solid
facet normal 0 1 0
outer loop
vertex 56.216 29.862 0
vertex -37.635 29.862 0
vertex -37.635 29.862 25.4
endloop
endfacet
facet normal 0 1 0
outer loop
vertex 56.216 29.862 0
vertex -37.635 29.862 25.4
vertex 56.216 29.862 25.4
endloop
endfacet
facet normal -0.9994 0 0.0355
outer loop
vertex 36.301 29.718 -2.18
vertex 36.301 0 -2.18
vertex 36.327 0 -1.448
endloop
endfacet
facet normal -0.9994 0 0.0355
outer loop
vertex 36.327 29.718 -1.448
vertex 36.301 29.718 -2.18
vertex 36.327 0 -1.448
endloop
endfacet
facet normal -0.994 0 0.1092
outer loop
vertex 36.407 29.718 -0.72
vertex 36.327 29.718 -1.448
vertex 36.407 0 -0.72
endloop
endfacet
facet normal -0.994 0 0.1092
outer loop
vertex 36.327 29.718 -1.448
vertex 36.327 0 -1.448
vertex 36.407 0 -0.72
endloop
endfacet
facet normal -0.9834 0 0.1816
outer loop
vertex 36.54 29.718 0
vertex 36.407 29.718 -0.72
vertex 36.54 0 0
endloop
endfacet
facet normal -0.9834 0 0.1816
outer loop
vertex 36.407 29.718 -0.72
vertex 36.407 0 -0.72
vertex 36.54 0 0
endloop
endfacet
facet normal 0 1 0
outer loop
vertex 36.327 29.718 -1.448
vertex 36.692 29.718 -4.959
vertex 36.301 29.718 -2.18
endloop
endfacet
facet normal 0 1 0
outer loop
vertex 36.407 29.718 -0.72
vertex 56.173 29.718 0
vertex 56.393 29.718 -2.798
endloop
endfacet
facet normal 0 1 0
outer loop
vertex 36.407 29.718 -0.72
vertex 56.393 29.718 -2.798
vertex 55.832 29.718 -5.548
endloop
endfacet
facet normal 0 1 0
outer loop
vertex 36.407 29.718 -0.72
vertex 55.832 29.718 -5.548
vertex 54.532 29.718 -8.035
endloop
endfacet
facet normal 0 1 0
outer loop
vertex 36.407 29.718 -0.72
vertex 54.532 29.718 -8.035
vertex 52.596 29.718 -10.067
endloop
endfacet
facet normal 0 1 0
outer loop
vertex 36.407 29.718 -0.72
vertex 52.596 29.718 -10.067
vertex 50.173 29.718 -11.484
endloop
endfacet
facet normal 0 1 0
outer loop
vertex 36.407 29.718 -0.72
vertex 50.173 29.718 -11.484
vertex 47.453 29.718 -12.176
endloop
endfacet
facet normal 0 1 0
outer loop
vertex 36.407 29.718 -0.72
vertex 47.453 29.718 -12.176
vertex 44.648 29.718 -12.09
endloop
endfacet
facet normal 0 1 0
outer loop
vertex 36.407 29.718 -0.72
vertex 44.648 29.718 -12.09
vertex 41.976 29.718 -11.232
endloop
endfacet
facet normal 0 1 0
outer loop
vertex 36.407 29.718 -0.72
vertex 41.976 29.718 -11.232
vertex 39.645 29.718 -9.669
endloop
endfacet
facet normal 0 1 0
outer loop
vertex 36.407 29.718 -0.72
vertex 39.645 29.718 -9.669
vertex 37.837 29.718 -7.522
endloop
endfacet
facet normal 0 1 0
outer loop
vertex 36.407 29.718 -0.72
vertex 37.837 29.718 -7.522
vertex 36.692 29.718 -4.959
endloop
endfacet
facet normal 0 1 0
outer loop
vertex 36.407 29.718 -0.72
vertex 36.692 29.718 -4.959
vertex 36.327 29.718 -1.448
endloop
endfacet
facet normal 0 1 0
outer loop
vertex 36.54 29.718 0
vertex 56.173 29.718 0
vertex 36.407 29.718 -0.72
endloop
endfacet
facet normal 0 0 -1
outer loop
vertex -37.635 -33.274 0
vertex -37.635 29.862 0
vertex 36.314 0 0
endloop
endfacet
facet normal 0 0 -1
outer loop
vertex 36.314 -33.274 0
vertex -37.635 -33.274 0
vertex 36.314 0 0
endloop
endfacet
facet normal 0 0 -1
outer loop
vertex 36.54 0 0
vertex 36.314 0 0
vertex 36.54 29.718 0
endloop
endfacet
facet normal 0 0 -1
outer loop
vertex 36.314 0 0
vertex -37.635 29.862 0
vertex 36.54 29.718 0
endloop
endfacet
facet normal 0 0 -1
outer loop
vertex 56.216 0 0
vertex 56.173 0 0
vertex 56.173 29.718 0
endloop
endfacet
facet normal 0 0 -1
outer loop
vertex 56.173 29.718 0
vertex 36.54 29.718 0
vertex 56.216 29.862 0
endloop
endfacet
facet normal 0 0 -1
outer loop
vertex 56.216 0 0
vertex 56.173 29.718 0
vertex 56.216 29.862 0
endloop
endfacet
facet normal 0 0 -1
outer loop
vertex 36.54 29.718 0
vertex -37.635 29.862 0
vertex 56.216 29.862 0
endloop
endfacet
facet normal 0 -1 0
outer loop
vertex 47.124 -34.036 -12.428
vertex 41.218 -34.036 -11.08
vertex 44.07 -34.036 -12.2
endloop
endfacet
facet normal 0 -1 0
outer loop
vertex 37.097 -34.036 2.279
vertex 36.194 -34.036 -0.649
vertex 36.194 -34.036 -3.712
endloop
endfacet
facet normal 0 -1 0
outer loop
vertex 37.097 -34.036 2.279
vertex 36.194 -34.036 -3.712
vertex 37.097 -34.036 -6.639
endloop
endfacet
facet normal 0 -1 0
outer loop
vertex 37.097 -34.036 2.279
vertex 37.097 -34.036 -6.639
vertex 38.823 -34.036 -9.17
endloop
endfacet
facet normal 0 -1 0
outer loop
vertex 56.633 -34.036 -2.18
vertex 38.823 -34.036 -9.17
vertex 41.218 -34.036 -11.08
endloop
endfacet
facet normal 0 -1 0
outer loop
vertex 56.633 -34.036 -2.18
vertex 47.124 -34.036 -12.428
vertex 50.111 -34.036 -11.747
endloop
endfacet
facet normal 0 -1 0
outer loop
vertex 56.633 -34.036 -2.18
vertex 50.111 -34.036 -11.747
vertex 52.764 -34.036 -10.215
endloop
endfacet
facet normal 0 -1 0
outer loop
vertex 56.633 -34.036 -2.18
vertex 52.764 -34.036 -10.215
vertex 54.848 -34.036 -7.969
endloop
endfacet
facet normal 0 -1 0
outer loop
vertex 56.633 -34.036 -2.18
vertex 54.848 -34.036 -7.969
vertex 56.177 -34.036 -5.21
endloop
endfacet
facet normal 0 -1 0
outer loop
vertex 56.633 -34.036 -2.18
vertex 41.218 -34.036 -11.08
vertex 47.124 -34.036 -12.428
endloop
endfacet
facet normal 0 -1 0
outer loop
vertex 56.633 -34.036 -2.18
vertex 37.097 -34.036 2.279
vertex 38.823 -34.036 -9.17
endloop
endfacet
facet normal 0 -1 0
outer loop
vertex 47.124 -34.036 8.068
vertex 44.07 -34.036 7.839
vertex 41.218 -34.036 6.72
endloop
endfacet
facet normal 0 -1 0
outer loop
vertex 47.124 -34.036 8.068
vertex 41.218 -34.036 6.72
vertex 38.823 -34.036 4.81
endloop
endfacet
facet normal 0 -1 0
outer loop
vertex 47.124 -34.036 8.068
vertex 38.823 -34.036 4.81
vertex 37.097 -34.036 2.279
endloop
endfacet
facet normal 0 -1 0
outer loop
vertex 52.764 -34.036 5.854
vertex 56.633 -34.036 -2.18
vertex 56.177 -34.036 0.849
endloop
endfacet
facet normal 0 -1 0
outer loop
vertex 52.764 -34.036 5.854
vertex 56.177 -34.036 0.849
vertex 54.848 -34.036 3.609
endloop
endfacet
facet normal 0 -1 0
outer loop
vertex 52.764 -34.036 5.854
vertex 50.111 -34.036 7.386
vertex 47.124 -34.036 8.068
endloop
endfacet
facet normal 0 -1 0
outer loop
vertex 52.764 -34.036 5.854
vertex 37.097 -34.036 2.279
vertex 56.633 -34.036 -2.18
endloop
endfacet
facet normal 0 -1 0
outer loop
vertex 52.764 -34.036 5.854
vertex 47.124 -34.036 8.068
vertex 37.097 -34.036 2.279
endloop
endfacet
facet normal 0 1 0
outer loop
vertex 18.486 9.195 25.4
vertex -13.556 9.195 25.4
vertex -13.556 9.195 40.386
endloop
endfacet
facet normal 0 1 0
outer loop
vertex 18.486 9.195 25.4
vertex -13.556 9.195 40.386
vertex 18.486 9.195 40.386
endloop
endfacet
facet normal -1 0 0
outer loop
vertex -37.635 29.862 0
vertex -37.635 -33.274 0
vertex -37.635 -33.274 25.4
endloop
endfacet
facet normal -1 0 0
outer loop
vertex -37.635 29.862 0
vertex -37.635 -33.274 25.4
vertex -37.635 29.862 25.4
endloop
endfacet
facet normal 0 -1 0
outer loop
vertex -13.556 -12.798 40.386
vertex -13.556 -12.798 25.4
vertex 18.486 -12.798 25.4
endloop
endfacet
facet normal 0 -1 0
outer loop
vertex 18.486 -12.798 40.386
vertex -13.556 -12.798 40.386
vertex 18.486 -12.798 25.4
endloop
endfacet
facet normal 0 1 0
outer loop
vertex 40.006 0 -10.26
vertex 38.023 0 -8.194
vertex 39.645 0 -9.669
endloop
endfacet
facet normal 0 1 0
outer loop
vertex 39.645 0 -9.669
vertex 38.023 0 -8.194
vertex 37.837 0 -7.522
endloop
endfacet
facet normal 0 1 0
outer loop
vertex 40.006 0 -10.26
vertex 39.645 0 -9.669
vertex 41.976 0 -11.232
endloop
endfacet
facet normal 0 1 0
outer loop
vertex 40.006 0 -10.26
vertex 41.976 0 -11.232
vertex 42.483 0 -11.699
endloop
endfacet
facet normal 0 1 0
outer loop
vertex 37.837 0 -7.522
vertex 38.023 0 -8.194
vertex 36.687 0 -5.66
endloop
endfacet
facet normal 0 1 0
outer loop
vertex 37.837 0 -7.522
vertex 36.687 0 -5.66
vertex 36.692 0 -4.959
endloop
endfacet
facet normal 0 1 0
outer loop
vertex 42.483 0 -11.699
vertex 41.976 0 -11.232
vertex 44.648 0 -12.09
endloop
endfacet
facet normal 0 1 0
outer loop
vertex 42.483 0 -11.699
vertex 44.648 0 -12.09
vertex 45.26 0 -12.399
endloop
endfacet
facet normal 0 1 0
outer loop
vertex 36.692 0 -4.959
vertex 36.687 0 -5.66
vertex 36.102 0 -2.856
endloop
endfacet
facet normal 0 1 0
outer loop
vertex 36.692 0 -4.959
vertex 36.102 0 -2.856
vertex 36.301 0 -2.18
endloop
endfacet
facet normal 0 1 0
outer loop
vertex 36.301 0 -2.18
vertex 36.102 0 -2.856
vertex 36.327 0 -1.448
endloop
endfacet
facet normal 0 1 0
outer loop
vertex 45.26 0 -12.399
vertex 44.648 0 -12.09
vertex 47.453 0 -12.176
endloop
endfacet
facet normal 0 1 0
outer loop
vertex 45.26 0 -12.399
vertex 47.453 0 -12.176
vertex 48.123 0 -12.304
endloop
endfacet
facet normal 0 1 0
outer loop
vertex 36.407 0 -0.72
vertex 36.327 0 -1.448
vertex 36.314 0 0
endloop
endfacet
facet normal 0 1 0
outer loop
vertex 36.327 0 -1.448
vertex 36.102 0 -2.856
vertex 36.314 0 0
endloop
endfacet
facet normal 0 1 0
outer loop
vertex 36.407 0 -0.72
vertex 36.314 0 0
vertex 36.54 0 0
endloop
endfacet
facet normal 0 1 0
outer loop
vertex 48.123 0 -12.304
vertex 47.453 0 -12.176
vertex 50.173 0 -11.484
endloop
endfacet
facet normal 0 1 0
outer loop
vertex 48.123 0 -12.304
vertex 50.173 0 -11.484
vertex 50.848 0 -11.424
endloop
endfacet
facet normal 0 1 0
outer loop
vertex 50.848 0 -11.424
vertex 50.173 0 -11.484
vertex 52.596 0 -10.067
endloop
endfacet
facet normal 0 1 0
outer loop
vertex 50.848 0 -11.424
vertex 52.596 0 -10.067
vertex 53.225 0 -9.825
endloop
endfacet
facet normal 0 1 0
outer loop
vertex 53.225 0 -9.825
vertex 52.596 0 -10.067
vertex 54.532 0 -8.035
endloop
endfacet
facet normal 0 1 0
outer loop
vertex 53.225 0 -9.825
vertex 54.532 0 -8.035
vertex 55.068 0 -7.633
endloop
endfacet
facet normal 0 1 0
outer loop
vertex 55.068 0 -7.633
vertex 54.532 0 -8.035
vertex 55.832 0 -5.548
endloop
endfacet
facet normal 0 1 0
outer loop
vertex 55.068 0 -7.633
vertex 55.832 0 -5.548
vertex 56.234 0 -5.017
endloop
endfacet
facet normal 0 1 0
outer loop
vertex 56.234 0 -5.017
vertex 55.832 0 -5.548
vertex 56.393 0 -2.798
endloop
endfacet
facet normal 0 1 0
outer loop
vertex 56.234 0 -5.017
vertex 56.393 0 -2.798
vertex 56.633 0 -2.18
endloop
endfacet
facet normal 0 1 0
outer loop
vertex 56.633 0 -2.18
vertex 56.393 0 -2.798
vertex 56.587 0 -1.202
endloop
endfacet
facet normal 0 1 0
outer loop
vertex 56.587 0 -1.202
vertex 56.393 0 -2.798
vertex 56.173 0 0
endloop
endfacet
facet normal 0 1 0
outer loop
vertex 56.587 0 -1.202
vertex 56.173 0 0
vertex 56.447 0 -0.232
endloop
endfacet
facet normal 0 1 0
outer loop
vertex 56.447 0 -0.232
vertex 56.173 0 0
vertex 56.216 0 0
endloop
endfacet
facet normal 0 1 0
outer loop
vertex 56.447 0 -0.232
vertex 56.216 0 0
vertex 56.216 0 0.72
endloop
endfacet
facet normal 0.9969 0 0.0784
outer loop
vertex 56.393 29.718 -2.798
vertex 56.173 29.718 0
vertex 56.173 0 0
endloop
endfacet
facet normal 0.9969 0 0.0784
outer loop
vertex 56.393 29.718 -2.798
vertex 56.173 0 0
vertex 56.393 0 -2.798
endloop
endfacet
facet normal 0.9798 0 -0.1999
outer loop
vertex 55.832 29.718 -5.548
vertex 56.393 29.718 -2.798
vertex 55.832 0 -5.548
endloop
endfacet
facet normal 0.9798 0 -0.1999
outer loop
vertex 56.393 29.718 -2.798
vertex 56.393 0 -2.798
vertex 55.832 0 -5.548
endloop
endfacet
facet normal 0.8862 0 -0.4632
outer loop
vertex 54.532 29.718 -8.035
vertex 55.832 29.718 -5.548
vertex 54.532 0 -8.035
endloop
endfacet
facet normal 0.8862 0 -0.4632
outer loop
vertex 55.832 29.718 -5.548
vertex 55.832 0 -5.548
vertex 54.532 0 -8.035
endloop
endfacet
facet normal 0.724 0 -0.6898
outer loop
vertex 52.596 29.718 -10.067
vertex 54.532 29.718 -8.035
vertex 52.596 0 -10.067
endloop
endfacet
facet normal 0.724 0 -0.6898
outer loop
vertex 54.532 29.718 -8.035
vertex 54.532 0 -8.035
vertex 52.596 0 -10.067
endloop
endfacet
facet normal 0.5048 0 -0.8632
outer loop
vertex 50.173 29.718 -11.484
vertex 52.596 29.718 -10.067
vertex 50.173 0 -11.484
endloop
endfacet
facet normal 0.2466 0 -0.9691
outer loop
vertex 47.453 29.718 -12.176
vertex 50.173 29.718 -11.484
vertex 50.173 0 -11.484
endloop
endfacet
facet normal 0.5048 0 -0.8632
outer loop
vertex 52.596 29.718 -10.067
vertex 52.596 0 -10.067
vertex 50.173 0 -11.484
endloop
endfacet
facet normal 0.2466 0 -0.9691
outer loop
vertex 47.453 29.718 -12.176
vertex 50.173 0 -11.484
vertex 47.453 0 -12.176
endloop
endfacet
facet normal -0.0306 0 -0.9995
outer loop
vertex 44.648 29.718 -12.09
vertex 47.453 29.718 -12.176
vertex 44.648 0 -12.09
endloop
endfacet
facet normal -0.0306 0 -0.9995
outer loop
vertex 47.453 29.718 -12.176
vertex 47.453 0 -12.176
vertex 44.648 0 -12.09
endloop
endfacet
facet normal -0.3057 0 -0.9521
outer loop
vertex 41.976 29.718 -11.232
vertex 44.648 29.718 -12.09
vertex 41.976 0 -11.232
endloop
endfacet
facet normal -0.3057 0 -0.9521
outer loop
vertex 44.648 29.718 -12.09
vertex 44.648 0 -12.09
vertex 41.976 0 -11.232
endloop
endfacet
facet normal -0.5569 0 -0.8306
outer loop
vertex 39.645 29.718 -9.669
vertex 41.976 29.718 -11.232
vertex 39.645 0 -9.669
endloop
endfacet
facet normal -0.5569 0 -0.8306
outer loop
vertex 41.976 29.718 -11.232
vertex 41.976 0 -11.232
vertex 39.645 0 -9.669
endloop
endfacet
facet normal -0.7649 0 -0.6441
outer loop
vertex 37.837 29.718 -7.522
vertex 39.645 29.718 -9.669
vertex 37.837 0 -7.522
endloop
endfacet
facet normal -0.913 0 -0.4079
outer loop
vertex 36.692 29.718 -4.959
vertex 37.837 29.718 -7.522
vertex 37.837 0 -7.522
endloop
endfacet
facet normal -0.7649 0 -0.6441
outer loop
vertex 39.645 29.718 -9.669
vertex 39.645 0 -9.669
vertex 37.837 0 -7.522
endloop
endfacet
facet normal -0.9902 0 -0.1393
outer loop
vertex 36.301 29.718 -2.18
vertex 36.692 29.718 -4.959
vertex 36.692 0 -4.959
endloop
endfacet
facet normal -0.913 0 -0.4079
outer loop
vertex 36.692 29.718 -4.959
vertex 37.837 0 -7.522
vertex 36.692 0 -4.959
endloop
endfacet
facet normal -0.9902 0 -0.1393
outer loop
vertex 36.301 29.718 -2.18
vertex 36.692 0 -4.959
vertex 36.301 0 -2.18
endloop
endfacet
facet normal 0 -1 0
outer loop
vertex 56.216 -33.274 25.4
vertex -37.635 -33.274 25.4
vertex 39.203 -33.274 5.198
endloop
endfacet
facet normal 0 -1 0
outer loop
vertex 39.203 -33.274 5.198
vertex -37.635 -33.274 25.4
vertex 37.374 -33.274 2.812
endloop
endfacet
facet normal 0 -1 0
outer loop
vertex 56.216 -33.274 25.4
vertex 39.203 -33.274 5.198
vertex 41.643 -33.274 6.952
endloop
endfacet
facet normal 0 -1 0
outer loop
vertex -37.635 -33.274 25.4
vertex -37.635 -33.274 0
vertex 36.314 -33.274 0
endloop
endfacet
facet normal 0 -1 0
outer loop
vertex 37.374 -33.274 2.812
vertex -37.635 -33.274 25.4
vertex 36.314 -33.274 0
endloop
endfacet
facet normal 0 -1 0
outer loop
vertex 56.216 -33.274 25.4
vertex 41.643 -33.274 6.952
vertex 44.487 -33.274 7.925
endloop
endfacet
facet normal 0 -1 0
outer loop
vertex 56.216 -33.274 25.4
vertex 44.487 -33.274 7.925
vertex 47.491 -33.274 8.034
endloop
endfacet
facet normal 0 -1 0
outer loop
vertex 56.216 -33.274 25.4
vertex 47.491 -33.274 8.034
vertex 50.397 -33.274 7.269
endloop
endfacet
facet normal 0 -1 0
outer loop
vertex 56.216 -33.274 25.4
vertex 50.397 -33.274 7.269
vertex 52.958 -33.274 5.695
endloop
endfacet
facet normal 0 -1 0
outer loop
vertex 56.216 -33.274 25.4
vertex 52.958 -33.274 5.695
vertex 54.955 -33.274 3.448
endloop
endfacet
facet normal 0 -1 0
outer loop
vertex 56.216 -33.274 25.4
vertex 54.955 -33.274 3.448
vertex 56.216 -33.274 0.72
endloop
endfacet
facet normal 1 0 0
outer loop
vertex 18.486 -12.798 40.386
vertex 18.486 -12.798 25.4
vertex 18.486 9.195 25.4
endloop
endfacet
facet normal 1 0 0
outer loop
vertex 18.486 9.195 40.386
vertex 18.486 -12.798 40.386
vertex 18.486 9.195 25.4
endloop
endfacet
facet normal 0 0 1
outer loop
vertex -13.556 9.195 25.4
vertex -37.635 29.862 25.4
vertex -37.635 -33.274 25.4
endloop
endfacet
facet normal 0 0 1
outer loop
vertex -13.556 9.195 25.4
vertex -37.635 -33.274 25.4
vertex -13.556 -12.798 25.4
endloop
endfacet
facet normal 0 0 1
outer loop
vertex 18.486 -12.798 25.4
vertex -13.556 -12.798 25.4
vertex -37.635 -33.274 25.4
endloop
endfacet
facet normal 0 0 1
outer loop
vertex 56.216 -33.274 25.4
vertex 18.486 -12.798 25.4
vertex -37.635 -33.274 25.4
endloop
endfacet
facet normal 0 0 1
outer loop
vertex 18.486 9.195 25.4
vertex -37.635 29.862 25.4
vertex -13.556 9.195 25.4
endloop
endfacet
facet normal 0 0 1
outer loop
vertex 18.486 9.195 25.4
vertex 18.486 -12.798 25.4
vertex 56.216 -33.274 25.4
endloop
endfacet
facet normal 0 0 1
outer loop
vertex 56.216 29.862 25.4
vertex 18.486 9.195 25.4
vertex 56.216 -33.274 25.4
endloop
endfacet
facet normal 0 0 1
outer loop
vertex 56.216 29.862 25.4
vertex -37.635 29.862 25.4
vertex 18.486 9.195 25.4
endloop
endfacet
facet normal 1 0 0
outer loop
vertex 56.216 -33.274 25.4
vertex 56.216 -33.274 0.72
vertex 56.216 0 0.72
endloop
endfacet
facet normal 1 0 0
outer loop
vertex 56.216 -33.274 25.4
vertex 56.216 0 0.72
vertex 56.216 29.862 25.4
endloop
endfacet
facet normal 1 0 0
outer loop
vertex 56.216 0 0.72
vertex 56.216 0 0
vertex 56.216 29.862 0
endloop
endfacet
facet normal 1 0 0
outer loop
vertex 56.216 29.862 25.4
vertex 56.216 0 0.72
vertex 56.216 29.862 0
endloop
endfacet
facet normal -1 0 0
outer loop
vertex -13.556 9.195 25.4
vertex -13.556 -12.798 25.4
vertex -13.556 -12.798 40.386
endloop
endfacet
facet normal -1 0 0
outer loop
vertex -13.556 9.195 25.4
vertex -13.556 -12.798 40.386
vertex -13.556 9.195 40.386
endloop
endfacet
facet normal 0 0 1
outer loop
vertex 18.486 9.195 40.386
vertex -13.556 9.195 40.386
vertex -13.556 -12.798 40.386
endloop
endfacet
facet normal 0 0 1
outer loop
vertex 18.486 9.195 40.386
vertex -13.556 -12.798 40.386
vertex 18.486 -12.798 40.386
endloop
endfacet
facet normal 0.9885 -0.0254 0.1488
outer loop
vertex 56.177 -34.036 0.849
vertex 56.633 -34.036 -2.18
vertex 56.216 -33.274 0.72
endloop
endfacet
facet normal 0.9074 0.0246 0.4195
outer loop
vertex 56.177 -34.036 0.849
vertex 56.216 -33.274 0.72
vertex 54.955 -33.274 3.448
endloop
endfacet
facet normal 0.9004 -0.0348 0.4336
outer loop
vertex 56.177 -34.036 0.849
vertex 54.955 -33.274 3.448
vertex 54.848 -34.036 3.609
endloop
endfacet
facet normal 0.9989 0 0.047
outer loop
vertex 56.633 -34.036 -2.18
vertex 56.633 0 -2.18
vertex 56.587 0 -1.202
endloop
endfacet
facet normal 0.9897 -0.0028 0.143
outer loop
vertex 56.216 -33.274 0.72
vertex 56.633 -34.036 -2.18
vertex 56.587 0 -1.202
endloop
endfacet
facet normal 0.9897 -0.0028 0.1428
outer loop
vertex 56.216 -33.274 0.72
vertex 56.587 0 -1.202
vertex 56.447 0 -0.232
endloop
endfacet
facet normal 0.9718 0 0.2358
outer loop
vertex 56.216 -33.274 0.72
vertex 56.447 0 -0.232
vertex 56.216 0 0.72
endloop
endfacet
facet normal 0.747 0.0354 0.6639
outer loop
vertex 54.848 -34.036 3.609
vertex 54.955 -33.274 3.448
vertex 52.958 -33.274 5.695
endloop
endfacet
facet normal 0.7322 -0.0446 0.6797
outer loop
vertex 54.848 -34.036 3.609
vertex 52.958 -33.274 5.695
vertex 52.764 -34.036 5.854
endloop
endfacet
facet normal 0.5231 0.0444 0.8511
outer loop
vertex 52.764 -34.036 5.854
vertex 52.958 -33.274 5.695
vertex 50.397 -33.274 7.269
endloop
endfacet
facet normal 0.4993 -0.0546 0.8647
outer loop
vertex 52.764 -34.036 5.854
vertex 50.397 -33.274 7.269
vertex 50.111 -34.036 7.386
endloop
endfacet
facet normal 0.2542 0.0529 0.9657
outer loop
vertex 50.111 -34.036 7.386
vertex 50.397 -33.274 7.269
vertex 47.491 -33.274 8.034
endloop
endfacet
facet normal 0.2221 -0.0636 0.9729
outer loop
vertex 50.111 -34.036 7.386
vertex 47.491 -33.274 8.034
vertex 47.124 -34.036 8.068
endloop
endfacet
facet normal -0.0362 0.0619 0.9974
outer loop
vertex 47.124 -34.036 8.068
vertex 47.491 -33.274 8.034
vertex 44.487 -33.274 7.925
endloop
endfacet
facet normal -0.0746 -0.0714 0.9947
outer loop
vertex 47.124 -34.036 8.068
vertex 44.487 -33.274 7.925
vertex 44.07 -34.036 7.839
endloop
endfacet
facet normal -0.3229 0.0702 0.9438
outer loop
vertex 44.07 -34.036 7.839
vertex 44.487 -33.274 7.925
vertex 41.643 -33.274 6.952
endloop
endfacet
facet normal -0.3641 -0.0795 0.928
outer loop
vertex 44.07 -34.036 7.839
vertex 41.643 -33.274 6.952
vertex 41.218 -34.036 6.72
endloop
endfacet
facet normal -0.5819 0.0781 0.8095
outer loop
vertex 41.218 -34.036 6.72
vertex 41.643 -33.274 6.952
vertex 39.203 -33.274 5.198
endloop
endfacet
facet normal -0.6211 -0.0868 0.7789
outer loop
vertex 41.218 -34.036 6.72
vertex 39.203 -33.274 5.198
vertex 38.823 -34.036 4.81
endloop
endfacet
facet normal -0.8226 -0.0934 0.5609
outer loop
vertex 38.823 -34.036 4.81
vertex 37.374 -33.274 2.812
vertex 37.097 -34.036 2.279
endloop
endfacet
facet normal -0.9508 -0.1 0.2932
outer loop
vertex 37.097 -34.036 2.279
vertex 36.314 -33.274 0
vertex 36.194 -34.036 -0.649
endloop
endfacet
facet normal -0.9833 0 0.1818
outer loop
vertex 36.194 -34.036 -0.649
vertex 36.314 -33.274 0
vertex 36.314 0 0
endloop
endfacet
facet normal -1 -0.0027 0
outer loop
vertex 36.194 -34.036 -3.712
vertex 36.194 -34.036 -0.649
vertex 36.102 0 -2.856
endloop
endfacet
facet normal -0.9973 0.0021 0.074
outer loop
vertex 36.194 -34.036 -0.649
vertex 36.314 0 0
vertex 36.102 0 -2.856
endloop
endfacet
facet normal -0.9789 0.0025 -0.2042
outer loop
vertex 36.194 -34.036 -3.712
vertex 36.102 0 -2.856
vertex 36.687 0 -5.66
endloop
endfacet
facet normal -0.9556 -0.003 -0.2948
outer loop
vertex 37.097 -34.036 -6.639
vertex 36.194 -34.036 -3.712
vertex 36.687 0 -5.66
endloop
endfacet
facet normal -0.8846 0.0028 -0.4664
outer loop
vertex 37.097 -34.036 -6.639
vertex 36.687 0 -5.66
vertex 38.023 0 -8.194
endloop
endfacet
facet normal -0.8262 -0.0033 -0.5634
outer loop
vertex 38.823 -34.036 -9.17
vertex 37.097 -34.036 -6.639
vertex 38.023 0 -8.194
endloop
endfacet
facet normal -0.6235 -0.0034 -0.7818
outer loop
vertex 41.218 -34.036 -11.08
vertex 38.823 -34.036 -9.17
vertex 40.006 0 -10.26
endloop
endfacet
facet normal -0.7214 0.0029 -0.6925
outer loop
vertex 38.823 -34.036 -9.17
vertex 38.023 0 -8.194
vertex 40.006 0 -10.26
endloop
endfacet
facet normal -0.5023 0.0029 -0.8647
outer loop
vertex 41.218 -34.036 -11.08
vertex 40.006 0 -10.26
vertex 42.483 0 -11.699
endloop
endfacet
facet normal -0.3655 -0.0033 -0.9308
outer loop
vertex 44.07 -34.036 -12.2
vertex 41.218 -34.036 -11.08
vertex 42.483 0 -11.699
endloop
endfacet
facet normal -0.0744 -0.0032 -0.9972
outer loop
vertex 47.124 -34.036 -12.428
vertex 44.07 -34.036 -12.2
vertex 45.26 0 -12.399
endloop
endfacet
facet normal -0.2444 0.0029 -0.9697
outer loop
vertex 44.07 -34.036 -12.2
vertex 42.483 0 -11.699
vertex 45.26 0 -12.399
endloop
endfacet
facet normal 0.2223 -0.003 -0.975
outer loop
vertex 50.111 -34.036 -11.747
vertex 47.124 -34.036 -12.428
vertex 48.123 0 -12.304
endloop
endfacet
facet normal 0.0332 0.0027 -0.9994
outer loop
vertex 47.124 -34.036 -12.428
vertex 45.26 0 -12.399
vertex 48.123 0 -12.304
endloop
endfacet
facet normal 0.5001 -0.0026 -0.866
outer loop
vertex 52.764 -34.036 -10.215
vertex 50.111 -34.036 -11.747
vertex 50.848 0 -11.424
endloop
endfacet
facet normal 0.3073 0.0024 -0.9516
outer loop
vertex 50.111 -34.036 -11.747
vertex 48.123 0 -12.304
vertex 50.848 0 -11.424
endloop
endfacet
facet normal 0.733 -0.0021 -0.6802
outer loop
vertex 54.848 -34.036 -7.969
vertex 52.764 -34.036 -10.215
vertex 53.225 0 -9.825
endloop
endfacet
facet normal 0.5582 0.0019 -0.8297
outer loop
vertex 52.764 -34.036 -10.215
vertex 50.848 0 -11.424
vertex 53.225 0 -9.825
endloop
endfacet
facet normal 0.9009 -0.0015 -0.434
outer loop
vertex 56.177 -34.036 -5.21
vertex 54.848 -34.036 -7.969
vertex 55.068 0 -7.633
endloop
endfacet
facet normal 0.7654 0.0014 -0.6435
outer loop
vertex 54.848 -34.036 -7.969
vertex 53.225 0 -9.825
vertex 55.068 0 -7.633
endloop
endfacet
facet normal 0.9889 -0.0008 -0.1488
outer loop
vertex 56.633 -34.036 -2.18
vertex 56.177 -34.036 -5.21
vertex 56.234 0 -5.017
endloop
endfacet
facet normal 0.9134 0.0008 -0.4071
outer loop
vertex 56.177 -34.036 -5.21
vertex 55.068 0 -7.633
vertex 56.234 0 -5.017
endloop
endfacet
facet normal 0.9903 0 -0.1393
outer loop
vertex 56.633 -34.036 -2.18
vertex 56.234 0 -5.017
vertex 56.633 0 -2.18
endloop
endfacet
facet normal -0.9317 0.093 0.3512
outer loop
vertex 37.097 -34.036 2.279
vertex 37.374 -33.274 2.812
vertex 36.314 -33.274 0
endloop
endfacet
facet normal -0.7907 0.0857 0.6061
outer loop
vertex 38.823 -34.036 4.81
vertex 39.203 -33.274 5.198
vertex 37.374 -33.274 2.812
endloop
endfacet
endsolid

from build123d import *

# Parameters (mm, degrees)
F0_W     = 93.85059
F0_H     = 63.135851
F1_DEPTH = 25.4
F2_R     = 10.276796
F3_DEPTH = 34.036
F5_DEPTH = 29.718
F6_W     = 32.04192
F6_H     = 21.99327
F7_DEPTH = 14.986


with BuildPart() as f1:
    # F0 (on Top) → F1 (new body)
    with BuildSketch(Plane.XY):
        with Locations((9.290259, -1.706374)):
            Rectangle(F0_W, F0_H)
    extrude(amount=F1_DEPTH)

    # F2 (on Front) → F3 (join)
    with BuildSketch(Plane.XZ):
        with Locations((46.356503, -2.180367)):
            Circle(F2_R)
    extrude(amount=F3_DEPTH)

    # F4 (on face) → F5 (join)
    with BuildSketch(Plane(origin=(0, 0, 0), x_dir=(-1, 0, 0), z_dir=(0, 1, 0))):
        with BuildLine():
            ThreePointArc((-56.173078, 0), (-47.453229, -12.176184), (-36.300701, -2.180367))
            ThreePointArc((-36.300701, -2.180367), (-36.360687, -1.083641), (-36.539928, 0))
            Line((-36.539928, 0), (-56.173078, 0))
        make_face()
    extrude(amount=F5_DEPTH)

    # F6 (on face) → F7 (join)
    with BuildSketch(Plane.XY.offset(25.4)):
        with Locations((2.464763, -1.801173)):
            Rectangle(F6_W, F6_H)
    extrude(amount=F7_DEPTH)


solid = f1.part
